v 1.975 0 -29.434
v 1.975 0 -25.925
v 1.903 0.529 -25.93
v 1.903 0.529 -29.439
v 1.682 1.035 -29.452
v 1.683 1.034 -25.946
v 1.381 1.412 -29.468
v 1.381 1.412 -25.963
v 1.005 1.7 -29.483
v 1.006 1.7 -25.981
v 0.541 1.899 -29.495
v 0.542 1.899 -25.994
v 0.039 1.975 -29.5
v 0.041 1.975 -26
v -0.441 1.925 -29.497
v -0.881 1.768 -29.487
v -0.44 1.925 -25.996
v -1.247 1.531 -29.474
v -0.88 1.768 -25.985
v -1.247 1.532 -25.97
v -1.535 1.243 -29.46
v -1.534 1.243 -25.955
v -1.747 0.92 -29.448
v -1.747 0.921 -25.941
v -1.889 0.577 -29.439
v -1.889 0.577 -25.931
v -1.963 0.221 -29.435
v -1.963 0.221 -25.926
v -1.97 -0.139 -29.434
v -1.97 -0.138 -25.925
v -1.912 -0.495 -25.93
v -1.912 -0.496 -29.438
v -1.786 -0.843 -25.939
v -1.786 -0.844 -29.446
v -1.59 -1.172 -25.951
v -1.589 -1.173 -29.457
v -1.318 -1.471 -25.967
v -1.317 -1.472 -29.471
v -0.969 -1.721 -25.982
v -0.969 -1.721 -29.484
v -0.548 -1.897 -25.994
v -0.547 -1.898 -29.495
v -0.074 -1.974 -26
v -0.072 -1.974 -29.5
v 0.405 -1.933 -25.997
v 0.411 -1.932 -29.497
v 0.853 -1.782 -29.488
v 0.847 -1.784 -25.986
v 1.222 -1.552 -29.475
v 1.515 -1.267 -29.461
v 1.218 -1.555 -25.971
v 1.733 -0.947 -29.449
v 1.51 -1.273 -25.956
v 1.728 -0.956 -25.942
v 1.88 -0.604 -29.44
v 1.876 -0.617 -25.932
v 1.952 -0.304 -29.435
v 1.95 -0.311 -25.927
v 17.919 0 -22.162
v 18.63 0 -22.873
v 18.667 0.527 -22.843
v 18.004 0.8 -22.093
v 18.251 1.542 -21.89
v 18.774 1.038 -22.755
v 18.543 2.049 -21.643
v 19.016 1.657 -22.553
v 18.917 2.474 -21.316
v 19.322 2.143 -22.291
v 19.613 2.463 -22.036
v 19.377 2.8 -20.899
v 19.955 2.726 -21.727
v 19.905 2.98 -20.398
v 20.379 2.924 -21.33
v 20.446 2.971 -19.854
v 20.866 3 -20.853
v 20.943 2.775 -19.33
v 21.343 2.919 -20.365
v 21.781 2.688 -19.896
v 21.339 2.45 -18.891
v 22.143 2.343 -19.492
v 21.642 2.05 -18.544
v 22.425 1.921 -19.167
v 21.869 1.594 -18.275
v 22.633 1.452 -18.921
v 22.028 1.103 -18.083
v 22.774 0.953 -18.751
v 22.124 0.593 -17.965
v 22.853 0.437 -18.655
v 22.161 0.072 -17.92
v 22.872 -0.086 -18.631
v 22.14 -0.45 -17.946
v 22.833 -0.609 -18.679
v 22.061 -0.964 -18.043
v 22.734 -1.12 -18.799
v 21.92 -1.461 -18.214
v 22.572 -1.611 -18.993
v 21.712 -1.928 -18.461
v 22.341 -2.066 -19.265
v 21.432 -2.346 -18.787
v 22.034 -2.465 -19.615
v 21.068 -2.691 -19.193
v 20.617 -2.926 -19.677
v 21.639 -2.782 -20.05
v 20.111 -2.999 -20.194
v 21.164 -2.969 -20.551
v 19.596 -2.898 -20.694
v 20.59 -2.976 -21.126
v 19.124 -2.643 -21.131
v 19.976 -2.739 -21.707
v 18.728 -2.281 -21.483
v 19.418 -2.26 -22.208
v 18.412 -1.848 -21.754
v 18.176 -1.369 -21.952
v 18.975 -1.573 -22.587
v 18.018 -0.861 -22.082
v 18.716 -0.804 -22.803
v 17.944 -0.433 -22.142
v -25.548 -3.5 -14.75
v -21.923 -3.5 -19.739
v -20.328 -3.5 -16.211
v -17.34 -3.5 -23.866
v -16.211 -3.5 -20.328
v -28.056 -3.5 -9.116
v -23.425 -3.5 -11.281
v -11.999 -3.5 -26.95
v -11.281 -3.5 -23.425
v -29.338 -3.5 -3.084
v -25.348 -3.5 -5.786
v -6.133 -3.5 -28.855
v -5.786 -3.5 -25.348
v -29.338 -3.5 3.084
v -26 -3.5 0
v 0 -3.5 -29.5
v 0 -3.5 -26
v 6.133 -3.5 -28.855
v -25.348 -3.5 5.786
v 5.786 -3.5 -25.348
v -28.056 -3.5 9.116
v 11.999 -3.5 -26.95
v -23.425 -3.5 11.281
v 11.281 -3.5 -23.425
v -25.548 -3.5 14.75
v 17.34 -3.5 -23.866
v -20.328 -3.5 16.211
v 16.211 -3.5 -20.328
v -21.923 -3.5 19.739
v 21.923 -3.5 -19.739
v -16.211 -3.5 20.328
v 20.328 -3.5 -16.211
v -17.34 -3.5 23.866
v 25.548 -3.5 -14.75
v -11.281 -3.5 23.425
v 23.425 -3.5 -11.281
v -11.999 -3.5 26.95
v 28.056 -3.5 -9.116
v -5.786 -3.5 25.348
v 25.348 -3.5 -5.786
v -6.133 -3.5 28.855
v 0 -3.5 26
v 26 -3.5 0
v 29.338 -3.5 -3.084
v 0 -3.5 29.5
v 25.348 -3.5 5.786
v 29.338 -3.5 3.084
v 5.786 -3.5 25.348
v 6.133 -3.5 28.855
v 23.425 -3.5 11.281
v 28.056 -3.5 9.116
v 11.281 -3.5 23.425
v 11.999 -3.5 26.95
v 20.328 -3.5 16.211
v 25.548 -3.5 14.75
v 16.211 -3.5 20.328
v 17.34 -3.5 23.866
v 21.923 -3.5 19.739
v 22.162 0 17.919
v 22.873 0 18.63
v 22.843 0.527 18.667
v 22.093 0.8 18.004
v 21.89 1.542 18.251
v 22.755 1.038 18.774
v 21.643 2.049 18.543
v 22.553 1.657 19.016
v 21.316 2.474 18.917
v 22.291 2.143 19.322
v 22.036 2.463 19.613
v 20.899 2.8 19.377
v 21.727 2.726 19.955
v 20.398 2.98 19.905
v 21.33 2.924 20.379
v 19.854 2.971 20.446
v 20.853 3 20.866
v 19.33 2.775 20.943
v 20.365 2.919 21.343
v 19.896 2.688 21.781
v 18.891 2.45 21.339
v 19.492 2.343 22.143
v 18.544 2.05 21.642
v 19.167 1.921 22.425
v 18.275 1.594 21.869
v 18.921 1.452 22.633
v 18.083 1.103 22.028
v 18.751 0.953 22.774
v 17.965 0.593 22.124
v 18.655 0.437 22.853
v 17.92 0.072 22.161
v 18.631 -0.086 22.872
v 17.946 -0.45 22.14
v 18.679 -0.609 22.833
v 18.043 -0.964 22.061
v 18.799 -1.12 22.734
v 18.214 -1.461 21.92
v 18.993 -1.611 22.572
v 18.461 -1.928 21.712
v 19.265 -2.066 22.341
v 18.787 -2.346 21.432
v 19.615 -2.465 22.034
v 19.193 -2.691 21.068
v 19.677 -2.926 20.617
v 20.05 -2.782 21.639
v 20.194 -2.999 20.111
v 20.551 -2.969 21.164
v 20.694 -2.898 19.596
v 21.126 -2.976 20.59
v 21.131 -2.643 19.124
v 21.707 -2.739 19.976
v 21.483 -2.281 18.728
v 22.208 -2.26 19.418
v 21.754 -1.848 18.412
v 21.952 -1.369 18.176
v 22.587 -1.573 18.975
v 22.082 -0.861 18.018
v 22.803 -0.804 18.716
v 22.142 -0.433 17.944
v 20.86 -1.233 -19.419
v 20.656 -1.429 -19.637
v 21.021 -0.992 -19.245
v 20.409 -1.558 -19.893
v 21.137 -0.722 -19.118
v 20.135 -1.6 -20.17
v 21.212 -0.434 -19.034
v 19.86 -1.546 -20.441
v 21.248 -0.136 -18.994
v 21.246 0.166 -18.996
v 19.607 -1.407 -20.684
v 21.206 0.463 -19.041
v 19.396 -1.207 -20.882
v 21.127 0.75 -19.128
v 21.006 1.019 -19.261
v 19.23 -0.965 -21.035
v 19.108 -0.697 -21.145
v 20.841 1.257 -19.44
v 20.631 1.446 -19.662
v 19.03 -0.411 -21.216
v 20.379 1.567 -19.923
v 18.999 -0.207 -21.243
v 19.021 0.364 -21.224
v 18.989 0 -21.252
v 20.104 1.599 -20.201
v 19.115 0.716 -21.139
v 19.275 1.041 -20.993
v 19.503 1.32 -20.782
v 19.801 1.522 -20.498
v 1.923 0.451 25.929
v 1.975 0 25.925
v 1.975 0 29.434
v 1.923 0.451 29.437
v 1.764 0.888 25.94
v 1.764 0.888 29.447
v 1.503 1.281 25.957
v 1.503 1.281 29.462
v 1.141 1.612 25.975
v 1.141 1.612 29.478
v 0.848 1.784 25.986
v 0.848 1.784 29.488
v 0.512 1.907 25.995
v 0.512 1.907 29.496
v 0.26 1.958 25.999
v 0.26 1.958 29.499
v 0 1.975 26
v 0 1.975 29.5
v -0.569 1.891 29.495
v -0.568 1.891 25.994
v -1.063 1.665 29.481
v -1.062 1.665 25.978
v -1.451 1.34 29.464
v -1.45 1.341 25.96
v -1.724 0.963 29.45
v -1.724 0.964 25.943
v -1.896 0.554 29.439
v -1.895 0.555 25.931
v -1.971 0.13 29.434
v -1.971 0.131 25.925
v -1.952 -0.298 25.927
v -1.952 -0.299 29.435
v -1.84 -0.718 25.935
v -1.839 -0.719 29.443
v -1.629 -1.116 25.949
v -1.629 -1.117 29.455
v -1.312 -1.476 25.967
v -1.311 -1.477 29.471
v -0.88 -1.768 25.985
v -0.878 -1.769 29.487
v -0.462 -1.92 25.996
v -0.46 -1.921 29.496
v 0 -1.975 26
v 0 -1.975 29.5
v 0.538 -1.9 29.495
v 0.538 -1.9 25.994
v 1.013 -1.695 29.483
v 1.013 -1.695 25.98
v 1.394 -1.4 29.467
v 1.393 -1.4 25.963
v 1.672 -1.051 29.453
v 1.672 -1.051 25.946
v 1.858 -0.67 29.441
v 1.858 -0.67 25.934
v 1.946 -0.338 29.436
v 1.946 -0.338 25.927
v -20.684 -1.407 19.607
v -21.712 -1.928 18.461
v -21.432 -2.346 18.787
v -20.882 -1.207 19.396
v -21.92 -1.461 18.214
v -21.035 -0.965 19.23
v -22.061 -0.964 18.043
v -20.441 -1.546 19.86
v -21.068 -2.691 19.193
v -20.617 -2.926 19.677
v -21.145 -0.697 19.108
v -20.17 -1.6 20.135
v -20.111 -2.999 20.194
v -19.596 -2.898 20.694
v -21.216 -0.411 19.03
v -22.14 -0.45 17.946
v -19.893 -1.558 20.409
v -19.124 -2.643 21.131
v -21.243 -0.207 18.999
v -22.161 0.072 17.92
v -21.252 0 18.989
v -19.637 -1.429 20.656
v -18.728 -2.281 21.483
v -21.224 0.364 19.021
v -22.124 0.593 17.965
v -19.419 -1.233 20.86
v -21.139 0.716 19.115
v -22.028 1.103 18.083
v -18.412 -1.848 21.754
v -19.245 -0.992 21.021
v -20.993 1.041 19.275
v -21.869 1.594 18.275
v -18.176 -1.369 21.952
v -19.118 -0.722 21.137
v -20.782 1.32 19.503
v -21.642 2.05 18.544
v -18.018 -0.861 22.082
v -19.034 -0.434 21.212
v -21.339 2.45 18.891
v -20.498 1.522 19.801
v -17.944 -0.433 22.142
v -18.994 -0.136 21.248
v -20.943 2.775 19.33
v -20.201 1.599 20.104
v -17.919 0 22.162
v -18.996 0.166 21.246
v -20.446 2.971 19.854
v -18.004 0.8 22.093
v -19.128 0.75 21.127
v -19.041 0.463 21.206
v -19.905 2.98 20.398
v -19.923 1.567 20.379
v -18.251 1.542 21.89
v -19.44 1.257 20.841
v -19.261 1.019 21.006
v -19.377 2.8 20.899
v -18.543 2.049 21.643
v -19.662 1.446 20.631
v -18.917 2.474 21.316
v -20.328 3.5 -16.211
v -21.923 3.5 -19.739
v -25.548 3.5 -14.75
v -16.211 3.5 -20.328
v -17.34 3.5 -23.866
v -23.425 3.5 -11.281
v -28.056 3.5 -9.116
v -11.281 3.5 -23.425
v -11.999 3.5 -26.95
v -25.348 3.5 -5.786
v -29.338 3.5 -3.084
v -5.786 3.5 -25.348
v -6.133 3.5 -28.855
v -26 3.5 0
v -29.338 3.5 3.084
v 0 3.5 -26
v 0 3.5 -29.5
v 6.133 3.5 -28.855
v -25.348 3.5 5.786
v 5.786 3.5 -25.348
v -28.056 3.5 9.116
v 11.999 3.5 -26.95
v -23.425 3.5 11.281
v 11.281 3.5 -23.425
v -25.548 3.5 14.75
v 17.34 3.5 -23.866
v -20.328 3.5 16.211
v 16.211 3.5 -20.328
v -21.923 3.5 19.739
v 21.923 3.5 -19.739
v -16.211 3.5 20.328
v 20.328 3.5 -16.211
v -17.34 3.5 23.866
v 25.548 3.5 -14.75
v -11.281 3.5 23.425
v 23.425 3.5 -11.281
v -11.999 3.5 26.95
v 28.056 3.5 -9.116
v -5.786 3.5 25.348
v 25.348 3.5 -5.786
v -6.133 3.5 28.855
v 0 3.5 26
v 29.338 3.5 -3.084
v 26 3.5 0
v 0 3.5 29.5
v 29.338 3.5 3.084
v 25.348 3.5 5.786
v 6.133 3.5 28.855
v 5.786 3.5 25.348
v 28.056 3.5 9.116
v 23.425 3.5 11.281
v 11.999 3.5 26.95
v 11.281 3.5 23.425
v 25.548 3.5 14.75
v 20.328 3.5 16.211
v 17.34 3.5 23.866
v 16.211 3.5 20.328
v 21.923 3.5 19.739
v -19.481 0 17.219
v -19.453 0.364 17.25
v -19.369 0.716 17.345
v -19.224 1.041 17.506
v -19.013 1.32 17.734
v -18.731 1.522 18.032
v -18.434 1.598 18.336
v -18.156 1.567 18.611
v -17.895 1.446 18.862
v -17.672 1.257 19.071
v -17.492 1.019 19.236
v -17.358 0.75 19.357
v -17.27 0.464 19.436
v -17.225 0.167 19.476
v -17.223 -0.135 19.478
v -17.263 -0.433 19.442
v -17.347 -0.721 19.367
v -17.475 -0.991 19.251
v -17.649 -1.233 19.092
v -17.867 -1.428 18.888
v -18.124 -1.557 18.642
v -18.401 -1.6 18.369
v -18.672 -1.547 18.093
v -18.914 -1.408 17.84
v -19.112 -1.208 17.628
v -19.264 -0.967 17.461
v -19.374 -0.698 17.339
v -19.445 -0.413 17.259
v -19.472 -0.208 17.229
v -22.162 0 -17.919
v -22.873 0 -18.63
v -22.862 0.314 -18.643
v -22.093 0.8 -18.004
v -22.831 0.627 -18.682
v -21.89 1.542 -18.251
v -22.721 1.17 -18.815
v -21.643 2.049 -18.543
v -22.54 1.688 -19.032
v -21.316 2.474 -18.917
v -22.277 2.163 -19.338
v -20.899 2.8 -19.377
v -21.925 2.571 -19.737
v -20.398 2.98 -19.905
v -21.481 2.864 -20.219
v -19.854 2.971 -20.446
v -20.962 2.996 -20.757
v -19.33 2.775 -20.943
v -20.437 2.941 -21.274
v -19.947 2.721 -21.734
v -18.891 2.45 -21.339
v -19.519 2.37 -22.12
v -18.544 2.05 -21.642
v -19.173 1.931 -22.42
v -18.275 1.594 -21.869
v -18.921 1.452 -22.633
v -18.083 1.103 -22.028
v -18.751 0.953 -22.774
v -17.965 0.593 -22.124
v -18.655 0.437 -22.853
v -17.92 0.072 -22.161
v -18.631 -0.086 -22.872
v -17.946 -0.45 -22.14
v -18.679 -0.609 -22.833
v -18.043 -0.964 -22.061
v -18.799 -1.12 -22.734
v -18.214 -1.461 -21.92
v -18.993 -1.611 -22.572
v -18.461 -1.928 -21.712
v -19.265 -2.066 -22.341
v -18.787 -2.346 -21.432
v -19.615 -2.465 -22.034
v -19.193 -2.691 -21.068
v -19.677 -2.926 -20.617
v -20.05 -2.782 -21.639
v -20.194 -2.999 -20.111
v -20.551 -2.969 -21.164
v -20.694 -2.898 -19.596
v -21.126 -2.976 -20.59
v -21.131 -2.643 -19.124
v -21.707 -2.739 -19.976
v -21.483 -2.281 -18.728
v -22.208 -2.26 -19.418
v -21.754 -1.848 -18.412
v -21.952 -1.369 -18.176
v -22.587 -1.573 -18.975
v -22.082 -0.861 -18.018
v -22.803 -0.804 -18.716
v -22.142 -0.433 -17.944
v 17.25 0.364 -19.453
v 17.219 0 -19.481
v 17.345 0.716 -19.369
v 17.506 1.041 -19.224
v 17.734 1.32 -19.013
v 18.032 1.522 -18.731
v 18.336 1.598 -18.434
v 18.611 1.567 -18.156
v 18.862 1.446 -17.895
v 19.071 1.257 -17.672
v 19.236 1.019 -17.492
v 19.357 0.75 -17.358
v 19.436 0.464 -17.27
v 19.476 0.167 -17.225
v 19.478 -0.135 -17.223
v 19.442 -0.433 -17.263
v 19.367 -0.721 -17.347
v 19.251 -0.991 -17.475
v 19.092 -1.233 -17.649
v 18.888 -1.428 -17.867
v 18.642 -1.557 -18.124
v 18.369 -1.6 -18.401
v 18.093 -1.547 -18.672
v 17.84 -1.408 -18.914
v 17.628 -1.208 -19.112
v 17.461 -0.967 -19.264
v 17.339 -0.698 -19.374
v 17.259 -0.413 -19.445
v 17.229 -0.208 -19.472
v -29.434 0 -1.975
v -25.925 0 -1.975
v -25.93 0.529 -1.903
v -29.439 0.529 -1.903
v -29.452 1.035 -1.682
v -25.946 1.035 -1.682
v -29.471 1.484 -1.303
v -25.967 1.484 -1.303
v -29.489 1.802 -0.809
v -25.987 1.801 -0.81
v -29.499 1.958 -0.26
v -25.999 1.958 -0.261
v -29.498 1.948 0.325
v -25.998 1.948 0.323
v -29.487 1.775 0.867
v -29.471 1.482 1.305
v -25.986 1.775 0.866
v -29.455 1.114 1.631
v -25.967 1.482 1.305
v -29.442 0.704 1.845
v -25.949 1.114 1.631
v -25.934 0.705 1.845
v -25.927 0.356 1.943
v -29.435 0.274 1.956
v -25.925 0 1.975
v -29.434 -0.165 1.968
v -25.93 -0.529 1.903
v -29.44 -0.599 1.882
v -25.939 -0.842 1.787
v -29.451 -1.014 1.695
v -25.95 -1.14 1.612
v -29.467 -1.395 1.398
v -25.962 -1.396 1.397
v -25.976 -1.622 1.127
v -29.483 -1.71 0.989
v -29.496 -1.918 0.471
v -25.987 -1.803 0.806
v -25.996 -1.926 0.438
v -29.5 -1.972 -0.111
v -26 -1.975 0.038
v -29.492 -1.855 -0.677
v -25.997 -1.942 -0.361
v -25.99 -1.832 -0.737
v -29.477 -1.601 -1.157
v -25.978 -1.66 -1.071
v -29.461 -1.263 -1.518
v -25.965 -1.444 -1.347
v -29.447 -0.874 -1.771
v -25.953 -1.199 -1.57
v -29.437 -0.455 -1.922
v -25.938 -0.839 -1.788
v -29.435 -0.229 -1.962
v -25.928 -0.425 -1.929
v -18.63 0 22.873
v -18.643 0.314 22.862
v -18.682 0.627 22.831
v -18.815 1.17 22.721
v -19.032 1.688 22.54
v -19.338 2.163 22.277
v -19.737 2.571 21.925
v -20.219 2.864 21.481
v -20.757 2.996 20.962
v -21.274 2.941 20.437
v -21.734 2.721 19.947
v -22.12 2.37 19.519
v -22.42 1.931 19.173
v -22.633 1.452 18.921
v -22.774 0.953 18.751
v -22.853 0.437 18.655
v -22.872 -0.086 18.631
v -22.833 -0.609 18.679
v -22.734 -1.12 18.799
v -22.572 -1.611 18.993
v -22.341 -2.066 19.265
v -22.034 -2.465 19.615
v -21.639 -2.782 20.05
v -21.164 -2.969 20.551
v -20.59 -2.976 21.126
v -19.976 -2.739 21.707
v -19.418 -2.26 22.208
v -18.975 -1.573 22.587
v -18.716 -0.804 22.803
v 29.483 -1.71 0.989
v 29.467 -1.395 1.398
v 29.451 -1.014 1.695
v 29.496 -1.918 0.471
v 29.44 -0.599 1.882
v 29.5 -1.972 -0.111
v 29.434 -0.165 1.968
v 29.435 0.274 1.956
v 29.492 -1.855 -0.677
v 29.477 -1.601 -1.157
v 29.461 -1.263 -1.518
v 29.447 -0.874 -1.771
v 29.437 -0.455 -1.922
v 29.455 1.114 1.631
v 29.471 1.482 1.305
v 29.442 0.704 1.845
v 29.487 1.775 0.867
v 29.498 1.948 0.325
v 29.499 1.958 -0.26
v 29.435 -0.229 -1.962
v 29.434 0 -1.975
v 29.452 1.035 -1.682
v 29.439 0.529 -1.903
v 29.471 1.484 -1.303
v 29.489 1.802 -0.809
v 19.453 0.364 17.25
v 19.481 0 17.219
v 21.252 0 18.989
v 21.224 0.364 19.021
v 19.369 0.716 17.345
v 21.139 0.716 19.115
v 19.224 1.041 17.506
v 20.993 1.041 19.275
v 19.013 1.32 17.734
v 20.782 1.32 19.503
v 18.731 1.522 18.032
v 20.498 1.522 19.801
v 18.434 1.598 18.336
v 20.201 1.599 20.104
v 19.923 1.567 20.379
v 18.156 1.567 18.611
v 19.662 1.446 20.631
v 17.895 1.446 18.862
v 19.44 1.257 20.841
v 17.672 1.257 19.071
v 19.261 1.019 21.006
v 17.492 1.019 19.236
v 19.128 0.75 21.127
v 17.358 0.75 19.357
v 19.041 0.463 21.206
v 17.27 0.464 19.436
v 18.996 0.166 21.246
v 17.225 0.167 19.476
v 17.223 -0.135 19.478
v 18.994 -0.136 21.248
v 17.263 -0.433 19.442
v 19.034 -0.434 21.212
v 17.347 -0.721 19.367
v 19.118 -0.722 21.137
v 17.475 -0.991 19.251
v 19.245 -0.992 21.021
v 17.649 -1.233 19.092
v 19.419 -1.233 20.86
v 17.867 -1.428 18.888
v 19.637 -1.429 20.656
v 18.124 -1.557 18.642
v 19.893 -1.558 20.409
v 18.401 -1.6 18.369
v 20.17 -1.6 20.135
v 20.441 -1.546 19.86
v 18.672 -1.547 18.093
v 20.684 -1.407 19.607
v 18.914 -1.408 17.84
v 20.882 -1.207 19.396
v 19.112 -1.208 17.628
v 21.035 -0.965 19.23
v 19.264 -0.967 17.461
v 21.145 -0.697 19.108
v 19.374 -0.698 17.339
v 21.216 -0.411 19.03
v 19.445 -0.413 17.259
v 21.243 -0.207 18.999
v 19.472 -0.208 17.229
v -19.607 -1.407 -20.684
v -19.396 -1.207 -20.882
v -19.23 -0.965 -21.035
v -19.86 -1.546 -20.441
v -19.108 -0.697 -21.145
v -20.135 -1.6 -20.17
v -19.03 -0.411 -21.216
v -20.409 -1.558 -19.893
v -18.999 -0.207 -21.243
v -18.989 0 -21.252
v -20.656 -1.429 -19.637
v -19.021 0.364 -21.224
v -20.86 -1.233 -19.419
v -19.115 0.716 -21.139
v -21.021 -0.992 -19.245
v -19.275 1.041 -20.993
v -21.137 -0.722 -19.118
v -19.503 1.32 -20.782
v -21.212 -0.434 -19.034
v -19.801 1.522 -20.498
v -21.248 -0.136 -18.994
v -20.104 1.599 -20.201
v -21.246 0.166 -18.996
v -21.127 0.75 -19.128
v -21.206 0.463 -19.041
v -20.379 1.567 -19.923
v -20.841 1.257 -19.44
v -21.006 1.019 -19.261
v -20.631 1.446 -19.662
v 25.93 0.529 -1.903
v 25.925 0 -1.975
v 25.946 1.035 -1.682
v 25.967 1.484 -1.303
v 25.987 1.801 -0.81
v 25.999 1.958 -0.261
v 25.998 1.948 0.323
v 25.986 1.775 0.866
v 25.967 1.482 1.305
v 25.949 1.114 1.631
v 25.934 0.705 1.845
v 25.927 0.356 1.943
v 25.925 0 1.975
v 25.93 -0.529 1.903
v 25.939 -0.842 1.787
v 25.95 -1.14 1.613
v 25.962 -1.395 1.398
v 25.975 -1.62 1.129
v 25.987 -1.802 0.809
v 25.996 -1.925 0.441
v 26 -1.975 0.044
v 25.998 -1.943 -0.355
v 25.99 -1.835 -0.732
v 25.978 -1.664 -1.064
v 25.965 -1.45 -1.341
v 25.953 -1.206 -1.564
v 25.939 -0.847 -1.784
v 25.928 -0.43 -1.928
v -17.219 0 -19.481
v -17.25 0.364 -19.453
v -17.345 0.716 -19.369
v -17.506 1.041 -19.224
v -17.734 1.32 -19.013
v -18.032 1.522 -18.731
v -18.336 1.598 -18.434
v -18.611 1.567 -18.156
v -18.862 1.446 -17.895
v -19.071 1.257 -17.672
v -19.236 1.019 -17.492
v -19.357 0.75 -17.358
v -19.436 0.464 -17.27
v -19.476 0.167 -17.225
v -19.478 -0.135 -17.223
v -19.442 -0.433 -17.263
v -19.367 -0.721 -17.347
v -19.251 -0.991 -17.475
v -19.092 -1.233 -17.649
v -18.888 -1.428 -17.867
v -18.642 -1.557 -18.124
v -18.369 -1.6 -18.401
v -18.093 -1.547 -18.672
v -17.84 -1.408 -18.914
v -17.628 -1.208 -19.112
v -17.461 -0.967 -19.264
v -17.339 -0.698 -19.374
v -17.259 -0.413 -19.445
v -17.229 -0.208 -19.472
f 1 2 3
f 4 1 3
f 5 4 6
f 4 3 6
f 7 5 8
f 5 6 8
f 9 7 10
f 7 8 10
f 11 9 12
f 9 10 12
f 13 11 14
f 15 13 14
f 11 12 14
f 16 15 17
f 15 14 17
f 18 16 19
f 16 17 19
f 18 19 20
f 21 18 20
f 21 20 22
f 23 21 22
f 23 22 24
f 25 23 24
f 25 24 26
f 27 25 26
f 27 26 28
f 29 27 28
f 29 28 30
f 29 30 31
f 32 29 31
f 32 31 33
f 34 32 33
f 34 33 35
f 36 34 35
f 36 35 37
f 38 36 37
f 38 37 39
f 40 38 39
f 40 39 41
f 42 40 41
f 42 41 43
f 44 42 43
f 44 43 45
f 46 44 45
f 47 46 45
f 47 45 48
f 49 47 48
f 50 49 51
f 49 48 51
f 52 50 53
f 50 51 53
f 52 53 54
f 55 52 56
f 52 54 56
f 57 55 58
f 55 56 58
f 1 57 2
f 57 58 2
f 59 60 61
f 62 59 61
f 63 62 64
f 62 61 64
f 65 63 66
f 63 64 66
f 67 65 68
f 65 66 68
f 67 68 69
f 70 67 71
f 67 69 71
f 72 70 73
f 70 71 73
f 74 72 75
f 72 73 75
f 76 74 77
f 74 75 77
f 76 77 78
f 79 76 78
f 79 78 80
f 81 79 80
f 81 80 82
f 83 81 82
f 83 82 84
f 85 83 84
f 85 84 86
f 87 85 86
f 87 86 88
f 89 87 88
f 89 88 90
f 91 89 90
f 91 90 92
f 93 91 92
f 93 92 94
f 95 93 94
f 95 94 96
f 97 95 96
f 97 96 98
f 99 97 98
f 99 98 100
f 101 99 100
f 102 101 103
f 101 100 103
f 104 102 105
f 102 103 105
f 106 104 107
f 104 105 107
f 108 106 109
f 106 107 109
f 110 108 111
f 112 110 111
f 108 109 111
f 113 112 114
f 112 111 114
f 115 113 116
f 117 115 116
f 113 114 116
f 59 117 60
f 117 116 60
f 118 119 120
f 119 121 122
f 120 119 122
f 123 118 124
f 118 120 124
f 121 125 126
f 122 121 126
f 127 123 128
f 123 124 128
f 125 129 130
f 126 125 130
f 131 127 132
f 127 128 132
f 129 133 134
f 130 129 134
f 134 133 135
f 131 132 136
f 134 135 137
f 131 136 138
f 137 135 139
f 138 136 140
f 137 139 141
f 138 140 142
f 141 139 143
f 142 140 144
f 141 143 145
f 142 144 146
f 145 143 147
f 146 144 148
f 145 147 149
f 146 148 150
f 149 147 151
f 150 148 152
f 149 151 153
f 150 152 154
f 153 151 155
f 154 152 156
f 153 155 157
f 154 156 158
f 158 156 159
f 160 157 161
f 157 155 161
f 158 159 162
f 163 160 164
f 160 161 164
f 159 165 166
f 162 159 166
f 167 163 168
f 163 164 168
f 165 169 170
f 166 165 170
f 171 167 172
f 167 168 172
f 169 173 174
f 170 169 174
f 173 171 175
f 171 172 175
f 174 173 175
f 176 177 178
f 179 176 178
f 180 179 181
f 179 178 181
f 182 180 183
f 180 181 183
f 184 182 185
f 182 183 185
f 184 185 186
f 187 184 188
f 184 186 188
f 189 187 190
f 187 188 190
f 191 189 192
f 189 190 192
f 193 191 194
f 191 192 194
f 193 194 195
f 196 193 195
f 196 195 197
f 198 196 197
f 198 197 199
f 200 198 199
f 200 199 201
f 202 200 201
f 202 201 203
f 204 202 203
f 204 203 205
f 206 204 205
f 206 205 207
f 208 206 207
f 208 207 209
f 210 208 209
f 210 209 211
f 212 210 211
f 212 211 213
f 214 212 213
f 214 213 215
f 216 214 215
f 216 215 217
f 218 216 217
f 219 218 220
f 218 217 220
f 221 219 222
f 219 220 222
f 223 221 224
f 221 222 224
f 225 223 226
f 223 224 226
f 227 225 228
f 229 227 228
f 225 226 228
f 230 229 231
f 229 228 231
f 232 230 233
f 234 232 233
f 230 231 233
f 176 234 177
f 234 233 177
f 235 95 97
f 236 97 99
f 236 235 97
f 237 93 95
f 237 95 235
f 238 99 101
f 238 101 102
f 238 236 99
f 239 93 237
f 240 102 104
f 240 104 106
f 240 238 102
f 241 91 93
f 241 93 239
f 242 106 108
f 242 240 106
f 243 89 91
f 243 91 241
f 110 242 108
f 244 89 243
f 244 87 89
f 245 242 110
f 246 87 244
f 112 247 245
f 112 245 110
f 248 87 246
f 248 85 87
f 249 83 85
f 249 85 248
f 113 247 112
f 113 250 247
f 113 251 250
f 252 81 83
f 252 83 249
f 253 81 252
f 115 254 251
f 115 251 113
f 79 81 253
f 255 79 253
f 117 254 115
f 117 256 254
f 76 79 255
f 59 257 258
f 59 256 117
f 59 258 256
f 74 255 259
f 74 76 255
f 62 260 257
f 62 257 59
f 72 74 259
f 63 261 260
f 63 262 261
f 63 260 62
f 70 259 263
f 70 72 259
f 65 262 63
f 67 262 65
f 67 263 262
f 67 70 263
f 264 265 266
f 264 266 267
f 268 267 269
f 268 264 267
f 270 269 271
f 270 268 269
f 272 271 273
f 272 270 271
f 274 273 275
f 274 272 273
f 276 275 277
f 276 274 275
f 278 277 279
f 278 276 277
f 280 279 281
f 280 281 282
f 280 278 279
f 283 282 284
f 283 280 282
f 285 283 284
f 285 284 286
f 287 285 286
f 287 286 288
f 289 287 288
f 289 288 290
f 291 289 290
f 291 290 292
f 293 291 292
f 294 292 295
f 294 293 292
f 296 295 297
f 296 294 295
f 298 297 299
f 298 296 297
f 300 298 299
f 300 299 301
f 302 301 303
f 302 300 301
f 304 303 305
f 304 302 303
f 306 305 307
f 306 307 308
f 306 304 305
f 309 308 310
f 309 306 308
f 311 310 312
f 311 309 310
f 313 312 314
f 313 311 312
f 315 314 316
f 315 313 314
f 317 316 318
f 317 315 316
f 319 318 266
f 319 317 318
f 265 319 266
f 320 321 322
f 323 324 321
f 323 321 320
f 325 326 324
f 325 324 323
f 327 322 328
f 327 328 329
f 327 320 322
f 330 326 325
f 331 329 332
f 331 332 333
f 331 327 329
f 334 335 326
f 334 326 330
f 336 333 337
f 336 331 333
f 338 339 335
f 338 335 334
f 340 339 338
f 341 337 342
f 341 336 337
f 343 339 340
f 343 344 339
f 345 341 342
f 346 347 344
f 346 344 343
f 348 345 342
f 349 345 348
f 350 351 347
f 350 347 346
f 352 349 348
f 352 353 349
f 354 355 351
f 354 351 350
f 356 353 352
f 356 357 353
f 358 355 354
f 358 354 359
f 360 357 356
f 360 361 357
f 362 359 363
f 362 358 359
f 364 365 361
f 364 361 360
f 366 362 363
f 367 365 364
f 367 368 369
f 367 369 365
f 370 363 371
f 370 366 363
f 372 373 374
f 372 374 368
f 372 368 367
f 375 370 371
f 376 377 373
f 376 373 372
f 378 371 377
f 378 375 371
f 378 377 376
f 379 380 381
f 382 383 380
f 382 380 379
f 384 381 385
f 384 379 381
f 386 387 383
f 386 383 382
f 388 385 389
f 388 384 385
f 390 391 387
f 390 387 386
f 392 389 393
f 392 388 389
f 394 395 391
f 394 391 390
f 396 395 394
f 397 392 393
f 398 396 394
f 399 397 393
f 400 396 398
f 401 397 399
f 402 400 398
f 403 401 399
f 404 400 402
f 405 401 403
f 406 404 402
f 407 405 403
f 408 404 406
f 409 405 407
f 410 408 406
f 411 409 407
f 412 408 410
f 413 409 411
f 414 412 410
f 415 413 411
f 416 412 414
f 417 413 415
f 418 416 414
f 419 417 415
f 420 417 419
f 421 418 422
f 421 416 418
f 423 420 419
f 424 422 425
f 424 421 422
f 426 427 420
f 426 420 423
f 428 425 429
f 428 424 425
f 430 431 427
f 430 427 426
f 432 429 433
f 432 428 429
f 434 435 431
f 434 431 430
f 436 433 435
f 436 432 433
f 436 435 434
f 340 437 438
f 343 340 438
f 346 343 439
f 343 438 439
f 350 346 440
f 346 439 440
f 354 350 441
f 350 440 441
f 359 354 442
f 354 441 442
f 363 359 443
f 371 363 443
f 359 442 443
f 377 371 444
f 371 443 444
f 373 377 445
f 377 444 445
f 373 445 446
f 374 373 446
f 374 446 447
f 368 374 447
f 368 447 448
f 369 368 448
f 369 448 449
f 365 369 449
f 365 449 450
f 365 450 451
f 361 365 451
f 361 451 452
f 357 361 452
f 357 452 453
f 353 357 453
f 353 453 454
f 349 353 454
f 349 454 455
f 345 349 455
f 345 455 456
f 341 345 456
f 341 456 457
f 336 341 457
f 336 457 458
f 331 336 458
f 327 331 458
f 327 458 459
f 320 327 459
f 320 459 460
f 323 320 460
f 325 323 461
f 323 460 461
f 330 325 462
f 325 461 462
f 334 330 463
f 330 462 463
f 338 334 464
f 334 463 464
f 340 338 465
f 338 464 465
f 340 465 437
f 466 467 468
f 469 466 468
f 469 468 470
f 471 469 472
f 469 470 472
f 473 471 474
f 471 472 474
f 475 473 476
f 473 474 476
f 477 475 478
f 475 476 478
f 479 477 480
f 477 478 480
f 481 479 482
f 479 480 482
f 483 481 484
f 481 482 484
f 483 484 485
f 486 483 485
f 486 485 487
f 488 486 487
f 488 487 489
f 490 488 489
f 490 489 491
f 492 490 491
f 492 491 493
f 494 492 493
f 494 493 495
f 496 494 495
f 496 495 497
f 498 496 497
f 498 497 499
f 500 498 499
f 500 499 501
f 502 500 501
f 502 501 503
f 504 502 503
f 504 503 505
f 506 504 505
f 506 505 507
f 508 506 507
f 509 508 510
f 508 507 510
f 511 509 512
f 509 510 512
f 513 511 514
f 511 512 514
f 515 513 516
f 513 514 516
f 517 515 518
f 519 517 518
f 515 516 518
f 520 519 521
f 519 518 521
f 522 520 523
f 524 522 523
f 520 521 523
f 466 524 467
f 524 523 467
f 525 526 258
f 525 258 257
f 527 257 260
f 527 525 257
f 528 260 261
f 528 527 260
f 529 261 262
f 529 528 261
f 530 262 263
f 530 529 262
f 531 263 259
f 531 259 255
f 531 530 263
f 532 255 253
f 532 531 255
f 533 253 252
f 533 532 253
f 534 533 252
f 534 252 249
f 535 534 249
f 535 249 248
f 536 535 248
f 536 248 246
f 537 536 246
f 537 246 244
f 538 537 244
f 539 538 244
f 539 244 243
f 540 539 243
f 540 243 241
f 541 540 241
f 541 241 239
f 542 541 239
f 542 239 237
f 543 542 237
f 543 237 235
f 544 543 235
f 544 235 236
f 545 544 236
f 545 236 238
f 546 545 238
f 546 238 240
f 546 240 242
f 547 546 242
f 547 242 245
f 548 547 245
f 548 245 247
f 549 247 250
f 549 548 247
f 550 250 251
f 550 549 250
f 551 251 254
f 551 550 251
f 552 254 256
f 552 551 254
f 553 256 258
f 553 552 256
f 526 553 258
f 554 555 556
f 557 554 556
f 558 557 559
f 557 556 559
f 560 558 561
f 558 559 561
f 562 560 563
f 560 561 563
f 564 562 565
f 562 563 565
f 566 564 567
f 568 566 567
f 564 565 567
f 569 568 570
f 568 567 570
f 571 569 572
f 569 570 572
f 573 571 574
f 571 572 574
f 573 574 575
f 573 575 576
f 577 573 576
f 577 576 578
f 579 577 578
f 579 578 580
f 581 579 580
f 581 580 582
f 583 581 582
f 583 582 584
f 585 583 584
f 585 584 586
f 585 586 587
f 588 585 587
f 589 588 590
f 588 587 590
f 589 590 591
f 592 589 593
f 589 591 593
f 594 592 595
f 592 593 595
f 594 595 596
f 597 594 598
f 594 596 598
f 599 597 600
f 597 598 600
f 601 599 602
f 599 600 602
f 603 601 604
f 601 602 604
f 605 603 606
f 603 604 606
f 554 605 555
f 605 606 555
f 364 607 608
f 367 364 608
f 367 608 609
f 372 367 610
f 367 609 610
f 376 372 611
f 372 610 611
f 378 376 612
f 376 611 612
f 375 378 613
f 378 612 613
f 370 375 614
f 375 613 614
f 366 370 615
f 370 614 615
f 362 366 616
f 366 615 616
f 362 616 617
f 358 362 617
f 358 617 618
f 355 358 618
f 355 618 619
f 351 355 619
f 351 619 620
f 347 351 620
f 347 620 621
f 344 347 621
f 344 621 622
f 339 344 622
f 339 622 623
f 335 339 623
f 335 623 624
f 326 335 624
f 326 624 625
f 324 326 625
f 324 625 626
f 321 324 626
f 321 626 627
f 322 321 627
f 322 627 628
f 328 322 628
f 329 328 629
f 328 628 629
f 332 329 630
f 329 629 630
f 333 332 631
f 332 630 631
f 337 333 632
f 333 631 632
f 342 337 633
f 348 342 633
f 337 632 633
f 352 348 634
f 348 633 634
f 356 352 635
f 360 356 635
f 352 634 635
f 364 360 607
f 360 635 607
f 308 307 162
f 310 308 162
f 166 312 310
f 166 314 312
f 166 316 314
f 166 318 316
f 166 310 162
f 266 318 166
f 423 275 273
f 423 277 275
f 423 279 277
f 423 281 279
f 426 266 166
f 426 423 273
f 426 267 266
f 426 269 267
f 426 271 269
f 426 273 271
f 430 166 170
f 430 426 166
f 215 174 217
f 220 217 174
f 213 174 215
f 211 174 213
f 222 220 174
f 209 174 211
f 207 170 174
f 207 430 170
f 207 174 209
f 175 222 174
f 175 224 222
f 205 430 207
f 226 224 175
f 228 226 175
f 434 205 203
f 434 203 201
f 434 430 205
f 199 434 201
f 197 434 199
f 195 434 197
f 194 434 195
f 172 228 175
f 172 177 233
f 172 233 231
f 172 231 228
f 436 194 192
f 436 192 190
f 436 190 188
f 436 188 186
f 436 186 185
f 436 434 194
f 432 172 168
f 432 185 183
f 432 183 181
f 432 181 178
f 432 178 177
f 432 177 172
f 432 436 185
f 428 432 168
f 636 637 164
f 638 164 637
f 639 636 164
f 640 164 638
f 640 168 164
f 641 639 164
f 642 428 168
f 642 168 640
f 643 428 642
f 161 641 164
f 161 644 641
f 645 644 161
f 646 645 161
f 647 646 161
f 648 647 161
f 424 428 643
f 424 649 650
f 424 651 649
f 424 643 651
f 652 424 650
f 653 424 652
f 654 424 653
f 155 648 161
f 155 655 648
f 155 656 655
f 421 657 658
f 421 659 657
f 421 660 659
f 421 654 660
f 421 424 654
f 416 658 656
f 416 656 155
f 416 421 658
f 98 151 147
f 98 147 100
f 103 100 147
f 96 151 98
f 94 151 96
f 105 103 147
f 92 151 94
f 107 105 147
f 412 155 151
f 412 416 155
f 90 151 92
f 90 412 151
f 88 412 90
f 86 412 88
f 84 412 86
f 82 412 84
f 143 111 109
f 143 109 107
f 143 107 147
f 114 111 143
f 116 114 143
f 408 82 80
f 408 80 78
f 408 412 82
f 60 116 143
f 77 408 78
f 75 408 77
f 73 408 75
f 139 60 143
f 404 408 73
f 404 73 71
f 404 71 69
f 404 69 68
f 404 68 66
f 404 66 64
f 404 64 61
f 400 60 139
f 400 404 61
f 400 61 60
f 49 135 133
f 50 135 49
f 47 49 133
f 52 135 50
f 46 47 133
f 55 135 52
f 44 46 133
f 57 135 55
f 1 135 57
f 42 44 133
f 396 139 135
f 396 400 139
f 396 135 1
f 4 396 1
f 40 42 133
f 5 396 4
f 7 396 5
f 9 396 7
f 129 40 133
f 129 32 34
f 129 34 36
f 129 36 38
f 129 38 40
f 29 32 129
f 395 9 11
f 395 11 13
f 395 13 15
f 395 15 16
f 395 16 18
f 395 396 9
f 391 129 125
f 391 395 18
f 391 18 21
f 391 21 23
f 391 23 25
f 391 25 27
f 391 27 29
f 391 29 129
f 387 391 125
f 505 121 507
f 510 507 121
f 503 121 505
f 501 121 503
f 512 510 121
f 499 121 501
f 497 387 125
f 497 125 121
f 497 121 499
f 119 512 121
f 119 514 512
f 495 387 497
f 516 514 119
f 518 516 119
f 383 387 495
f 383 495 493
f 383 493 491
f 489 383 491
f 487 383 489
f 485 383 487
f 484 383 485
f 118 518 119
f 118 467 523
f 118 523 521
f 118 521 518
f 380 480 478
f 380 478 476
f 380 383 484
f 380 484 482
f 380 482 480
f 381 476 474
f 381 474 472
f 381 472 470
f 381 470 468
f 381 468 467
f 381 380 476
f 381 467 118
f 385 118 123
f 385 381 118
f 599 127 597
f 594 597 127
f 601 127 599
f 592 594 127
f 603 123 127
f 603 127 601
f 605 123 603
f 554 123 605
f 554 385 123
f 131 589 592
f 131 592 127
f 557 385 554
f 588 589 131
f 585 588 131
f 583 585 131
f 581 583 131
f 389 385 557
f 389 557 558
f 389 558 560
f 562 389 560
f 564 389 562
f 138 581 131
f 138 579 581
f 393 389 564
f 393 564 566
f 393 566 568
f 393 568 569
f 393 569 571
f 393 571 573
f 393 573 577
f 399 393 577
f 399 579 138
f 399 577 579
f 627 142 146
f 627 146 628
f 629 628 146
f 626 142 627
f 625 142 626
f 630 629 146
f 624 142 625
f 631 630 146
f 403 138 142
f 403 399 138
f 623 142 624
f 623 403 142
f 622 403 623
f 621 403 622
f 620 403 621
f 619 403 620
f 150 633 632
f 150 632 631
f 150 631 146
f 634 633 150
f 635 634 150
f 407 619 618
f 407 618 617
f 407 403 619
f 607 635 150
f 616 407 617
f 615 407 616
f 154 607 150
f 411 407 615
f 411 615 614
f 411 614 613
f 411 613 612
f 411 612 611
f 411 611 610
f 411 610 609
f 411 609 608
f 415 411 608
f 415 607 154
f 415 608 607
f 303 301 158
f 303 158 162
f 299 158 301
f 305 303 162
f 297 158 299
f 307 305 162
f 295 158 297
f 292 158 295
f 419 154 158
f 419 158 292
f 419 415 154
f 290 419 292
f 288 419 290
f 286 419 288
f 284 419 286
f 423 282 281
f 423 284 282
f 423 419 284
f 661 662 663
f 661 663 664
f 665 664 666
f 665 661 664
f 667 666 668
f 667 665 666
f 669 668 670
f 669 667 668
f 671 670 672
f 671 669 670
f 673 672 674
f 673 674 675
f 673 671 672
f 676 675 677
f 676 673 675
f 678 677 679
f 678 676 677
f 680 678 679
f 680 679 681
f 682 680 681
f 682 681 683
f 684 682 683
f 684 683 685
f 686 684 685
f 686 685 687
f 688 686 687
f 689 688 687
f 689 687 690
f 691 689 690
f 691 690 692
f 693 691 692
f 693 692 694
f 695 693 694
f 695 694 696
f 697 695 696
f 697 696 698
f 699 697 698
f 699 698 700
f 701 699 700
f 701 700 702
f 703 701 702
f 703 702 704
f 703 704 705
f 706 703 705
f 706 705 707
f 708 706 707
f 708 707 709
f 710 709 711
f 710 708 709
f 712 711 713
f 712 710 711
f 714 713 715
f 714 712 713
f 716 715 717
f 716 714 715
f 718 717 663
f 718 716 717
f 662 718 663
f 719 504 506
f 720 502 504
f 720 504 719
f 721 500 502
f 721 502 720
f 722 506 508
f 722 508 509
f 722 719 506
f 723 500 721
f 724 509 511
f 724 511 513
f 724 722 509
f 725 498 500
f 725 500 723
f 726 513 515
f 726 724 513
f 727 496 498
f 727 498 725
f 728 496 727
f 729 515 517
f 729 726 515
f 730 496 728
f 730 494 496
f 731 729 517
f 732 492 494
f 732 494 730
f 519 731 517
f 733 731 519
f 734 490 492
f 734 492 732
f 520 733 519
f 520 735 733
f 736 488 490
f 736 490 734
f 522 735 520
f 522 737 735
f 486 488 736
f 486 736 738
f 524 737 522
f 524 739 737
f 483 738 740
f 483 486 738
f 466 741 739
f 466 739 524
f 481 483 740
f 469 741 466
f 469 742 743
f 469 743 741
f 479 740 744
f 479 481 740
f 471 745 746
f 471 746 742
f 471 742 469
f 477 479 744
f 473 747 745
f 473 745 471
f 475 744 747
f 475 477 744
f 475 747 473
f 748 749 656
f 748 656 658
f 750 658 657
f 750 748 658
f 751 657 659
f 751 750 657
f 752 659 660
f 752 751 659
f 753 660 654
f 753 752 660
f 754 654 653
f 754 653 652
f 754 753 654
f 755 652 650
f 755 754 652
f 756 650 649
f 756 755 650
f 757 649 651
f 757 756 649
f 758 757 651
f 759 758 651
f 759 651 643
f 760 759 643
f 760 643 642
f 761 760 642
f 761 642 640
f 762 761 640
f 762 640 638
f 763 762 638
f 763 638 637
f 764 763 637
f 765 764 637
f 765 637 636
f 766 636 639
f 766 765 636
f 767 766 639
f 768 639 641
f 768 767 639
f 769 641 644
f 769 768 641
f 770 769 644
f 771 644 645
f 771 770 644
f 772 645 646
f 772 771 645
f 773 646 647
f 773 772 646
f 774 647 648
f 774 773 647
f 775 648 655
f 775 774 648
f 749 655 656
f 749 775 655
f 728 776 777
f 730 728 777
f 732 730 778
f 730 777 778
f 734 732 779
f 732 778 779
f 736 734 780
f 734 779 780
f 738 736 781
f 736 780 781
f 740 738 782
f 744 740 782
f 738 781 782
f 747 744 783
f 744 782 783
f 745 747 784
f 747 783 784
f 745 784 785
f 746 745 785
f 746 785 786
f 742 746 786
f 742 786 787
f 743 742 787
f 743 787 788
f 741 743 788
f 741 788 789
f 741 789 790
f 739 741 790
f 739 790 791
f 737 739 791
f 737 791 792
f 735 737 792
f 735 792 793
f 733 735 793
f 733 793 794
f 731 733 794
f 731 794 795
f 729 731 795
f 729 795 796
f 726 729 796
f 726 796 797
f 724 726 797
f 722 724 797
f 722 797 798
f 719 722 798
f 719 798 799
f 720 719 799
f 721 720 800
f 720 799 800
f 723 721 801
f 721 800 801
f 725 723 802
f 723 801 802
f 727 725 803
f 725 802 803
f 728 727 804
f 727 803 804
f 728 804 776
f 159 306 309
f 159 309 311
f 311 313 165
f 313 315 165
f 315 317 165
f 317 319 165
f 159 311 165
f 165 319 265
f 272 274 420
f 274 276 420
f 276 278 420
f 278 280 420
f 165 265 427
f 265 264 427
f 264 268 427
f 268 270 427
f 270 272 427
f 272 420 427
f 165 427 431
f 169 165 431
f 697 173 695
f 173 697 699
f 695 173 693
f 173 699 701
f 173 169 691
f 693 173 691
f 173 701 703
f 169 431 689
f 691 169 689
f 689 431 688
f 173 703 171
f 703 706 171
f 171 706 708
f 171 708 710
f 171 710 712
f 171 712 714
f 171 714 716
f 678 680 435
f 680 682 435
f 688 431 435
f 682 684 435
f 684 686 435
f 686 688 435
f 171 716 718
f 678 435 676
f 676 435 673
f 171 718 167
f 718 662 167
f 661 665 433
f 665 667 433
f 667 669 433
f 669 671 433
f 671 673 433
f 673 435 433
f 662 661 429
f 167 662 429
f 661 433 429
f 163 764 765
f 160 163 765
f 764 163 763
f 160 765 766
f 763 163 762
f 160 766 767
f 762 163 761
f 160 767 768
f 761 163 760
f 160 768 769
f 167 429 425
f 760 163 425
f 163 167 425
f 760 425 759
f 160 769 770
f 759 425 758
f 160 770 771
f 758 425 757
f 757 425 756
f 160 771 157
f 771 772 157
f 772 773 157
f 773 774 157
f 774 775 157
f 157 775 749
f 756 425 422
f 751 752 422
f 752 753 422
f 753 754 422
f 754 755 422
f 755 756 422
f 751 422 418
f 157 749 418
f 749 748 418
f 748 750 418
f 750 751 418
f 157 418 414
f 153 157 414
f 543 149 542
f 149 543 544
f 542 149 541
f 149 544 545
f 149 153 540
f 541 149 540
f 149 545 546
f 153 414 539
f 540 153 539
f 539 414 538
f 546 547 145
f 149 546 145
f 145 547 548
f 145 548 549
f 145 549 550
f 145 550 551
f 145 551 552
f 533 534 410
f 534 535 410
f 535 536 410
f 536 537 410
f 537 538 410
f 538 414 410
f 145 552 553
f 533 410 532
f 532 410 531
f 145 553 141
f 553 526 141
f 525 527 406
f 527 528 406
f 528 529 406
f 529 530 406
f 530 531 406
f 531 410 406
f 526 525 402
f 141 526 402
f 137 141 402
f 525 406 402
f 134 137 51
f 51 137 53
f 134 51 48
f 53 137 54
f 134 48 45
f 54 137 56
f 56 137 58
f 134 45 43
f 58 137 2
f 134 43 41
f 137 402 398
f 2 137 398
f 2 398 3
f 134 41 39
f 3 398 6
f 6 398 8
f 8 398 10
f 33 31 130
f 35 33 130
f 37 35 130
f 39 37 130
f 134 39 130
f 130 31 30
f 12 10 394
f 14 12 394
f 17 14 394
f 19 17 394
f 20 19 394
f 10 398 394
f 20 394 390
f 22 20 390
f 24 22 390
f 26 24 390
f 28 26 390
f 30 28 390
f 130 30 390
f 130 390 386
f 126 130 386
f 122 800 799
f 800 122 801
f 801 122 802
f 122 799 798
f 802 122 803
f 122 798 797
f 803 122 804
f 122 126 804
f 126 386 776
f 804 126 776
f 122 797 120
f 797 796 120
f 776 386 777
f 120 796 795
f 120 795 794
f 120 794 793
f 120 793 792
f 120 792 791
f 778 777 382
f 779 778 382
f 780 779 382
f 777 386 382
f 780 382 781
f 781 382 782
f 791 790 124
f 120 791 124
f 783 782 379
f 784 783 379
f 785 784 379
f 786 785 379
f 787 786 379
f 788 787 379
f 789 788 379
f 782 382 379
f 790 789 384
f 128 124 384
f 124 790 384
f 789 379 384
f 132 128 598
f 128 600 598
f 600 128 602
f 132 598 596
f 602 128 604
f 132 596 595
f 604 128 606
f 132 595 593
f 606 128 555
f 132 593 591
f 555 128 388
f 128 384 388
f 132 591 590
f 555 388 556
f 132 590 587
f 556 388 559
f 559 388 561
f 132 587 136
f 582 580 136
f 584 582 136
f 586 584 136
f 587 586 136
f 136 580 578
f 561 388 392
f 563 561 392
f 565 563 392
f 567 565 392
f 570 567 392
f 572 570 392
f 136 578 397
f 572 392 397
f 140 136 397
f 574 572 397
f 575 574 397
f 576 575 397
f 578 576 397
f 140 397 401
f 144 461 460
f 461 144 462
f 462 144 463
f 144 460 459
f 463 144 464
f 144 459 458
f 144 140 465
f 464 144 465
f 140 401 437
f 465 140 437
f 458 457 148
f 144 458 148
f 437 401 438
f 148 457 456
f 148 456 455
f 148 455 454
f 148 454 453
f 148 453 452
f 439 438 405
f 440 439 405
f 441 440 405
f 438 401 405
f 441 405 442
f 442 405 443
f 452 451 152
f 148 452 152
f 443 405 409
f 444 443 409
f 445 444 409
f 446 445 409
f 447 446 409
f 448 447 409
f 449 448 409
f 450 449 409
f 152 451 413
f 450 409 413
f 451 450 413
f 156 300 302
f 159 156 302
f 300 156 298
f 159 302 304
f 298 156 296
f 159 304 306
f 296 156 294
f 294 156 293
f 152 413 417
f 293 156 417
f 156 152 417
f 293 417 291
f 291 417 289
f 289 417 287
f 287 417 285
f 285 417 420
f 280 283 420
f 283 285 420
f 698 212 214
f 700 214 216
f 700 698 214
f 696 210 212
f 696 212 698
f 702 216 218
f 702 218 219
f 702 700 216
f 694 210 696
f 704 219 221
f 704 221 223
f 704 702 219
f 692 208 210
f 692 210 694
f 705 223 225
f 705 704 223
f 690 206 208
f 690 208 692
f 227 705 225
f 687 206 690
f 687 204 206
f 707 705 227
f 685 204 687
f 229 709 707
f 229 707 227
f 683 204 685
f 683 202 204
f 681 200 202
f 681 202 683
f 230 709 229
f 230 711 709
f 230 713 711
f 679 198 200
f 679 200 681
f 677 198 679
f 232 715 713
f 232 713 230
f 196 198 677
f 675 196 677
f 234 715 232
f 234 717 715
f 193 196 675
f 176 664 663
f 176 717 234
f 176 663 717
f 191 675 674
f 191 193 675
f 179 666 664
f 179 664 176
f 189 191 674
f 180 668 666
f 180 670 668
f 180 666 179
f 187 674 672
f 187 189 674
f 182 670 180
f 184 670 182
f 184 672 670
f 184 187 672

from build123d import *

# Parameters (mm, degrees)
SKETCH1_R                = 29.5
SKETCH1_R_2              = 26
BOSS_EXTRUDE1_DEPTH      = 3.5
BOSS_EXTRUDE1_DEPTH_BACK = 3.5
SKETCH3_R                = 1.975
CUT_EXTRUDE1_DEPTH       = 42.865857211
CUT_EXTRUDE1_DEPTH_BACK  = 42.865857211
SKETCH4_R                = 1.975
CUT_EXTRUDE2_DEPTH       = 42.865857362
CUT_EXTRUDE2_DEPTH_BACK  = 42.865857362
SKETCH5_R                = 1.6
CUT_EXTRUDE3_DEPTH       = 42.865857364
CUT_EXTRUDE3_DEPTH_BACK  = 42.865857364
SKETCH6_R                = 1.6
CUT_EXTRUDE4_DEPTH       = 42.865857364
CUT_EXTRUDE4_DEPTH_BACK  = 42.865857364
CUT_EXTRUDE5_REACH       = 73.305
CUT_EXTRUDE5_END_RADIUS  = 28.5
SKETCH7_R                = 3
CIRPATTERN1_COUNT        = 4


with BuildPart() as part:
    # Sketch1 → Boss-Extrude1 (new, two sides)
    with BuildSketch(Plane(origin=(0, 0, 0), x_dir=(1, 0, 0), z_dir=(0, 1, 0))) as boss_extrude1_sk:
        with Locations(Location((0, 0, 0), (0, 0, 270))):
            Circle(SKETCH1_R)
        with Locations(Location((0, 0, 0), (0, 0, 270))):
            Circle(SKETCH1_R_2, mode=Mode.SUBTRACT)
    extrude(amount=BOSS_EXTRUDE1_DEPTH)
    extrude(boss_extrude1_sk.sketch, amount=-BOSS_EXTRUDE1_DEPTH_BACK)

    # Sketch3 → Cut-Extrude1 (cut, two sides)
    with BuildSketch(Plane(origin=(0, 0, 0), x_dir=(0, 0, -1), z_dir=(1, 0, 0))) as cut_extrude1_sk:
        Circle(SKETCH3_R)
    extrude(amount=CUT_EXTRUDE1_DEPTH, mode=Mode.SUBTRACT)
    extrude(cut_extrude1_sk.sketch, amount=-CUT_EXTRUDE1_DEPTH_BACK, mode=Mode.SUBTRACT)

    # Sketch4 → Cut-Extrude2 (cut, two sides)
    with BuildSketch(Plane.XY) as cut_extrude2_sk:
        Circle(SKETCH4_R)
    extrude(amount=CUT_EXTRUDE2_DEPTH, mode=Mode.SUBTRACT)
    extrude(cut_extrude2_sk.sketch, amount=-CUT_EXTRUDE2_DEPTH_BACK, mode=Mode.SUBTRACT)

    # Sketch5 → Cut-Extrude3 (cut, two sides)
    with BuildSketch(Plane(origin=(0, 0, 0), x_dir=(-0.7071067811865477, 0, -0.7071067811865475), z_dir=(0.7071067811865475, 0, -0.7071067811865477))) as cut_extrude3_sk:
        Circle(SKETCH5_R)
    extrude(amount=CUT_EXTRUDE3_DEPTH, mode=Mode.SUBTRACT)
    extrude(cut_extrude3_sk.sketch, amount=-CUT_EXTRUDE3_DEPTH_BACK, mode=Mode.SUBTRACT)

    # Sketch6 → Cut-Extrude4 (cut, two sides)
    with BuildSketch(Plane(origin=(0, 0, 0), x_dir=(0.7071067811865476, 0, -0.7071067811865476), z_dir=(0.7071067811865476, 0, 0.7071067811865476))) as cut_extrude4_sk:
        Circle(SKETCH6_R)
    extrude(amount=CUT_EXTRUDE4_DEPTH, mode=Mode.SUBTRACT)
    extrude(cut_extrude4_sk.sketch, amount=-CUT_EXTRUDE4_DEPTH_BACK, mode=Mode.SUBTRACT)

    # Cut-Extrude5: up to this cylinder (the profile starts outside it)
    cut_extrude5_end = Plane(origin=(0, 0, 0), z_dir=(0, 1, 0)) * Cylinder(CUT_EXTRUDE5_END_RADIUS, 204.61, mode=Mode.PRIVATE)
    # Sketch7 → Cut-Extrude5 (cut, up to the surface)
    with BuildSketch(Plane(origin=(20.859650045, 0, 20.859650045), x_dir=(0.7071067811865475, 0, -0.7071067811865477), z_dir=(0.7071067811865477, 0, 0.7071067811865475)), mode=Mode.PRIVATE) as cut_extrude5_sk1:
        Circle(SKETCH7_R)
    cut_extrude5_tool1 = extrude(cut_extrude5_sk1.sketch, amount=-CUT_EXTRUDE5_REACH, mode=Mode.PRIVATE) - cut_extrude5_end
    cut_extrude5 = cut_extrude5_tool1.solids().sort_by_distance((20.85965, 0, 20.85965))[0]
    add(cut_extrude5, mode=Mode.SUBTRACT)

    # CirPattern1: Cut-Extrude5 ×4 about axis
    cirpattern1_axis = Axis((0, 0, 0), (0, 1, 0))
    for i in range(1, CIRPATTERN1_COUNT):
        add(cut_extrude5.rotate(cirpattern1_axis, i * 360 / CIRPATTERN1_COUNT), mode=Mode.SUBTRACT)


solid = part.part
